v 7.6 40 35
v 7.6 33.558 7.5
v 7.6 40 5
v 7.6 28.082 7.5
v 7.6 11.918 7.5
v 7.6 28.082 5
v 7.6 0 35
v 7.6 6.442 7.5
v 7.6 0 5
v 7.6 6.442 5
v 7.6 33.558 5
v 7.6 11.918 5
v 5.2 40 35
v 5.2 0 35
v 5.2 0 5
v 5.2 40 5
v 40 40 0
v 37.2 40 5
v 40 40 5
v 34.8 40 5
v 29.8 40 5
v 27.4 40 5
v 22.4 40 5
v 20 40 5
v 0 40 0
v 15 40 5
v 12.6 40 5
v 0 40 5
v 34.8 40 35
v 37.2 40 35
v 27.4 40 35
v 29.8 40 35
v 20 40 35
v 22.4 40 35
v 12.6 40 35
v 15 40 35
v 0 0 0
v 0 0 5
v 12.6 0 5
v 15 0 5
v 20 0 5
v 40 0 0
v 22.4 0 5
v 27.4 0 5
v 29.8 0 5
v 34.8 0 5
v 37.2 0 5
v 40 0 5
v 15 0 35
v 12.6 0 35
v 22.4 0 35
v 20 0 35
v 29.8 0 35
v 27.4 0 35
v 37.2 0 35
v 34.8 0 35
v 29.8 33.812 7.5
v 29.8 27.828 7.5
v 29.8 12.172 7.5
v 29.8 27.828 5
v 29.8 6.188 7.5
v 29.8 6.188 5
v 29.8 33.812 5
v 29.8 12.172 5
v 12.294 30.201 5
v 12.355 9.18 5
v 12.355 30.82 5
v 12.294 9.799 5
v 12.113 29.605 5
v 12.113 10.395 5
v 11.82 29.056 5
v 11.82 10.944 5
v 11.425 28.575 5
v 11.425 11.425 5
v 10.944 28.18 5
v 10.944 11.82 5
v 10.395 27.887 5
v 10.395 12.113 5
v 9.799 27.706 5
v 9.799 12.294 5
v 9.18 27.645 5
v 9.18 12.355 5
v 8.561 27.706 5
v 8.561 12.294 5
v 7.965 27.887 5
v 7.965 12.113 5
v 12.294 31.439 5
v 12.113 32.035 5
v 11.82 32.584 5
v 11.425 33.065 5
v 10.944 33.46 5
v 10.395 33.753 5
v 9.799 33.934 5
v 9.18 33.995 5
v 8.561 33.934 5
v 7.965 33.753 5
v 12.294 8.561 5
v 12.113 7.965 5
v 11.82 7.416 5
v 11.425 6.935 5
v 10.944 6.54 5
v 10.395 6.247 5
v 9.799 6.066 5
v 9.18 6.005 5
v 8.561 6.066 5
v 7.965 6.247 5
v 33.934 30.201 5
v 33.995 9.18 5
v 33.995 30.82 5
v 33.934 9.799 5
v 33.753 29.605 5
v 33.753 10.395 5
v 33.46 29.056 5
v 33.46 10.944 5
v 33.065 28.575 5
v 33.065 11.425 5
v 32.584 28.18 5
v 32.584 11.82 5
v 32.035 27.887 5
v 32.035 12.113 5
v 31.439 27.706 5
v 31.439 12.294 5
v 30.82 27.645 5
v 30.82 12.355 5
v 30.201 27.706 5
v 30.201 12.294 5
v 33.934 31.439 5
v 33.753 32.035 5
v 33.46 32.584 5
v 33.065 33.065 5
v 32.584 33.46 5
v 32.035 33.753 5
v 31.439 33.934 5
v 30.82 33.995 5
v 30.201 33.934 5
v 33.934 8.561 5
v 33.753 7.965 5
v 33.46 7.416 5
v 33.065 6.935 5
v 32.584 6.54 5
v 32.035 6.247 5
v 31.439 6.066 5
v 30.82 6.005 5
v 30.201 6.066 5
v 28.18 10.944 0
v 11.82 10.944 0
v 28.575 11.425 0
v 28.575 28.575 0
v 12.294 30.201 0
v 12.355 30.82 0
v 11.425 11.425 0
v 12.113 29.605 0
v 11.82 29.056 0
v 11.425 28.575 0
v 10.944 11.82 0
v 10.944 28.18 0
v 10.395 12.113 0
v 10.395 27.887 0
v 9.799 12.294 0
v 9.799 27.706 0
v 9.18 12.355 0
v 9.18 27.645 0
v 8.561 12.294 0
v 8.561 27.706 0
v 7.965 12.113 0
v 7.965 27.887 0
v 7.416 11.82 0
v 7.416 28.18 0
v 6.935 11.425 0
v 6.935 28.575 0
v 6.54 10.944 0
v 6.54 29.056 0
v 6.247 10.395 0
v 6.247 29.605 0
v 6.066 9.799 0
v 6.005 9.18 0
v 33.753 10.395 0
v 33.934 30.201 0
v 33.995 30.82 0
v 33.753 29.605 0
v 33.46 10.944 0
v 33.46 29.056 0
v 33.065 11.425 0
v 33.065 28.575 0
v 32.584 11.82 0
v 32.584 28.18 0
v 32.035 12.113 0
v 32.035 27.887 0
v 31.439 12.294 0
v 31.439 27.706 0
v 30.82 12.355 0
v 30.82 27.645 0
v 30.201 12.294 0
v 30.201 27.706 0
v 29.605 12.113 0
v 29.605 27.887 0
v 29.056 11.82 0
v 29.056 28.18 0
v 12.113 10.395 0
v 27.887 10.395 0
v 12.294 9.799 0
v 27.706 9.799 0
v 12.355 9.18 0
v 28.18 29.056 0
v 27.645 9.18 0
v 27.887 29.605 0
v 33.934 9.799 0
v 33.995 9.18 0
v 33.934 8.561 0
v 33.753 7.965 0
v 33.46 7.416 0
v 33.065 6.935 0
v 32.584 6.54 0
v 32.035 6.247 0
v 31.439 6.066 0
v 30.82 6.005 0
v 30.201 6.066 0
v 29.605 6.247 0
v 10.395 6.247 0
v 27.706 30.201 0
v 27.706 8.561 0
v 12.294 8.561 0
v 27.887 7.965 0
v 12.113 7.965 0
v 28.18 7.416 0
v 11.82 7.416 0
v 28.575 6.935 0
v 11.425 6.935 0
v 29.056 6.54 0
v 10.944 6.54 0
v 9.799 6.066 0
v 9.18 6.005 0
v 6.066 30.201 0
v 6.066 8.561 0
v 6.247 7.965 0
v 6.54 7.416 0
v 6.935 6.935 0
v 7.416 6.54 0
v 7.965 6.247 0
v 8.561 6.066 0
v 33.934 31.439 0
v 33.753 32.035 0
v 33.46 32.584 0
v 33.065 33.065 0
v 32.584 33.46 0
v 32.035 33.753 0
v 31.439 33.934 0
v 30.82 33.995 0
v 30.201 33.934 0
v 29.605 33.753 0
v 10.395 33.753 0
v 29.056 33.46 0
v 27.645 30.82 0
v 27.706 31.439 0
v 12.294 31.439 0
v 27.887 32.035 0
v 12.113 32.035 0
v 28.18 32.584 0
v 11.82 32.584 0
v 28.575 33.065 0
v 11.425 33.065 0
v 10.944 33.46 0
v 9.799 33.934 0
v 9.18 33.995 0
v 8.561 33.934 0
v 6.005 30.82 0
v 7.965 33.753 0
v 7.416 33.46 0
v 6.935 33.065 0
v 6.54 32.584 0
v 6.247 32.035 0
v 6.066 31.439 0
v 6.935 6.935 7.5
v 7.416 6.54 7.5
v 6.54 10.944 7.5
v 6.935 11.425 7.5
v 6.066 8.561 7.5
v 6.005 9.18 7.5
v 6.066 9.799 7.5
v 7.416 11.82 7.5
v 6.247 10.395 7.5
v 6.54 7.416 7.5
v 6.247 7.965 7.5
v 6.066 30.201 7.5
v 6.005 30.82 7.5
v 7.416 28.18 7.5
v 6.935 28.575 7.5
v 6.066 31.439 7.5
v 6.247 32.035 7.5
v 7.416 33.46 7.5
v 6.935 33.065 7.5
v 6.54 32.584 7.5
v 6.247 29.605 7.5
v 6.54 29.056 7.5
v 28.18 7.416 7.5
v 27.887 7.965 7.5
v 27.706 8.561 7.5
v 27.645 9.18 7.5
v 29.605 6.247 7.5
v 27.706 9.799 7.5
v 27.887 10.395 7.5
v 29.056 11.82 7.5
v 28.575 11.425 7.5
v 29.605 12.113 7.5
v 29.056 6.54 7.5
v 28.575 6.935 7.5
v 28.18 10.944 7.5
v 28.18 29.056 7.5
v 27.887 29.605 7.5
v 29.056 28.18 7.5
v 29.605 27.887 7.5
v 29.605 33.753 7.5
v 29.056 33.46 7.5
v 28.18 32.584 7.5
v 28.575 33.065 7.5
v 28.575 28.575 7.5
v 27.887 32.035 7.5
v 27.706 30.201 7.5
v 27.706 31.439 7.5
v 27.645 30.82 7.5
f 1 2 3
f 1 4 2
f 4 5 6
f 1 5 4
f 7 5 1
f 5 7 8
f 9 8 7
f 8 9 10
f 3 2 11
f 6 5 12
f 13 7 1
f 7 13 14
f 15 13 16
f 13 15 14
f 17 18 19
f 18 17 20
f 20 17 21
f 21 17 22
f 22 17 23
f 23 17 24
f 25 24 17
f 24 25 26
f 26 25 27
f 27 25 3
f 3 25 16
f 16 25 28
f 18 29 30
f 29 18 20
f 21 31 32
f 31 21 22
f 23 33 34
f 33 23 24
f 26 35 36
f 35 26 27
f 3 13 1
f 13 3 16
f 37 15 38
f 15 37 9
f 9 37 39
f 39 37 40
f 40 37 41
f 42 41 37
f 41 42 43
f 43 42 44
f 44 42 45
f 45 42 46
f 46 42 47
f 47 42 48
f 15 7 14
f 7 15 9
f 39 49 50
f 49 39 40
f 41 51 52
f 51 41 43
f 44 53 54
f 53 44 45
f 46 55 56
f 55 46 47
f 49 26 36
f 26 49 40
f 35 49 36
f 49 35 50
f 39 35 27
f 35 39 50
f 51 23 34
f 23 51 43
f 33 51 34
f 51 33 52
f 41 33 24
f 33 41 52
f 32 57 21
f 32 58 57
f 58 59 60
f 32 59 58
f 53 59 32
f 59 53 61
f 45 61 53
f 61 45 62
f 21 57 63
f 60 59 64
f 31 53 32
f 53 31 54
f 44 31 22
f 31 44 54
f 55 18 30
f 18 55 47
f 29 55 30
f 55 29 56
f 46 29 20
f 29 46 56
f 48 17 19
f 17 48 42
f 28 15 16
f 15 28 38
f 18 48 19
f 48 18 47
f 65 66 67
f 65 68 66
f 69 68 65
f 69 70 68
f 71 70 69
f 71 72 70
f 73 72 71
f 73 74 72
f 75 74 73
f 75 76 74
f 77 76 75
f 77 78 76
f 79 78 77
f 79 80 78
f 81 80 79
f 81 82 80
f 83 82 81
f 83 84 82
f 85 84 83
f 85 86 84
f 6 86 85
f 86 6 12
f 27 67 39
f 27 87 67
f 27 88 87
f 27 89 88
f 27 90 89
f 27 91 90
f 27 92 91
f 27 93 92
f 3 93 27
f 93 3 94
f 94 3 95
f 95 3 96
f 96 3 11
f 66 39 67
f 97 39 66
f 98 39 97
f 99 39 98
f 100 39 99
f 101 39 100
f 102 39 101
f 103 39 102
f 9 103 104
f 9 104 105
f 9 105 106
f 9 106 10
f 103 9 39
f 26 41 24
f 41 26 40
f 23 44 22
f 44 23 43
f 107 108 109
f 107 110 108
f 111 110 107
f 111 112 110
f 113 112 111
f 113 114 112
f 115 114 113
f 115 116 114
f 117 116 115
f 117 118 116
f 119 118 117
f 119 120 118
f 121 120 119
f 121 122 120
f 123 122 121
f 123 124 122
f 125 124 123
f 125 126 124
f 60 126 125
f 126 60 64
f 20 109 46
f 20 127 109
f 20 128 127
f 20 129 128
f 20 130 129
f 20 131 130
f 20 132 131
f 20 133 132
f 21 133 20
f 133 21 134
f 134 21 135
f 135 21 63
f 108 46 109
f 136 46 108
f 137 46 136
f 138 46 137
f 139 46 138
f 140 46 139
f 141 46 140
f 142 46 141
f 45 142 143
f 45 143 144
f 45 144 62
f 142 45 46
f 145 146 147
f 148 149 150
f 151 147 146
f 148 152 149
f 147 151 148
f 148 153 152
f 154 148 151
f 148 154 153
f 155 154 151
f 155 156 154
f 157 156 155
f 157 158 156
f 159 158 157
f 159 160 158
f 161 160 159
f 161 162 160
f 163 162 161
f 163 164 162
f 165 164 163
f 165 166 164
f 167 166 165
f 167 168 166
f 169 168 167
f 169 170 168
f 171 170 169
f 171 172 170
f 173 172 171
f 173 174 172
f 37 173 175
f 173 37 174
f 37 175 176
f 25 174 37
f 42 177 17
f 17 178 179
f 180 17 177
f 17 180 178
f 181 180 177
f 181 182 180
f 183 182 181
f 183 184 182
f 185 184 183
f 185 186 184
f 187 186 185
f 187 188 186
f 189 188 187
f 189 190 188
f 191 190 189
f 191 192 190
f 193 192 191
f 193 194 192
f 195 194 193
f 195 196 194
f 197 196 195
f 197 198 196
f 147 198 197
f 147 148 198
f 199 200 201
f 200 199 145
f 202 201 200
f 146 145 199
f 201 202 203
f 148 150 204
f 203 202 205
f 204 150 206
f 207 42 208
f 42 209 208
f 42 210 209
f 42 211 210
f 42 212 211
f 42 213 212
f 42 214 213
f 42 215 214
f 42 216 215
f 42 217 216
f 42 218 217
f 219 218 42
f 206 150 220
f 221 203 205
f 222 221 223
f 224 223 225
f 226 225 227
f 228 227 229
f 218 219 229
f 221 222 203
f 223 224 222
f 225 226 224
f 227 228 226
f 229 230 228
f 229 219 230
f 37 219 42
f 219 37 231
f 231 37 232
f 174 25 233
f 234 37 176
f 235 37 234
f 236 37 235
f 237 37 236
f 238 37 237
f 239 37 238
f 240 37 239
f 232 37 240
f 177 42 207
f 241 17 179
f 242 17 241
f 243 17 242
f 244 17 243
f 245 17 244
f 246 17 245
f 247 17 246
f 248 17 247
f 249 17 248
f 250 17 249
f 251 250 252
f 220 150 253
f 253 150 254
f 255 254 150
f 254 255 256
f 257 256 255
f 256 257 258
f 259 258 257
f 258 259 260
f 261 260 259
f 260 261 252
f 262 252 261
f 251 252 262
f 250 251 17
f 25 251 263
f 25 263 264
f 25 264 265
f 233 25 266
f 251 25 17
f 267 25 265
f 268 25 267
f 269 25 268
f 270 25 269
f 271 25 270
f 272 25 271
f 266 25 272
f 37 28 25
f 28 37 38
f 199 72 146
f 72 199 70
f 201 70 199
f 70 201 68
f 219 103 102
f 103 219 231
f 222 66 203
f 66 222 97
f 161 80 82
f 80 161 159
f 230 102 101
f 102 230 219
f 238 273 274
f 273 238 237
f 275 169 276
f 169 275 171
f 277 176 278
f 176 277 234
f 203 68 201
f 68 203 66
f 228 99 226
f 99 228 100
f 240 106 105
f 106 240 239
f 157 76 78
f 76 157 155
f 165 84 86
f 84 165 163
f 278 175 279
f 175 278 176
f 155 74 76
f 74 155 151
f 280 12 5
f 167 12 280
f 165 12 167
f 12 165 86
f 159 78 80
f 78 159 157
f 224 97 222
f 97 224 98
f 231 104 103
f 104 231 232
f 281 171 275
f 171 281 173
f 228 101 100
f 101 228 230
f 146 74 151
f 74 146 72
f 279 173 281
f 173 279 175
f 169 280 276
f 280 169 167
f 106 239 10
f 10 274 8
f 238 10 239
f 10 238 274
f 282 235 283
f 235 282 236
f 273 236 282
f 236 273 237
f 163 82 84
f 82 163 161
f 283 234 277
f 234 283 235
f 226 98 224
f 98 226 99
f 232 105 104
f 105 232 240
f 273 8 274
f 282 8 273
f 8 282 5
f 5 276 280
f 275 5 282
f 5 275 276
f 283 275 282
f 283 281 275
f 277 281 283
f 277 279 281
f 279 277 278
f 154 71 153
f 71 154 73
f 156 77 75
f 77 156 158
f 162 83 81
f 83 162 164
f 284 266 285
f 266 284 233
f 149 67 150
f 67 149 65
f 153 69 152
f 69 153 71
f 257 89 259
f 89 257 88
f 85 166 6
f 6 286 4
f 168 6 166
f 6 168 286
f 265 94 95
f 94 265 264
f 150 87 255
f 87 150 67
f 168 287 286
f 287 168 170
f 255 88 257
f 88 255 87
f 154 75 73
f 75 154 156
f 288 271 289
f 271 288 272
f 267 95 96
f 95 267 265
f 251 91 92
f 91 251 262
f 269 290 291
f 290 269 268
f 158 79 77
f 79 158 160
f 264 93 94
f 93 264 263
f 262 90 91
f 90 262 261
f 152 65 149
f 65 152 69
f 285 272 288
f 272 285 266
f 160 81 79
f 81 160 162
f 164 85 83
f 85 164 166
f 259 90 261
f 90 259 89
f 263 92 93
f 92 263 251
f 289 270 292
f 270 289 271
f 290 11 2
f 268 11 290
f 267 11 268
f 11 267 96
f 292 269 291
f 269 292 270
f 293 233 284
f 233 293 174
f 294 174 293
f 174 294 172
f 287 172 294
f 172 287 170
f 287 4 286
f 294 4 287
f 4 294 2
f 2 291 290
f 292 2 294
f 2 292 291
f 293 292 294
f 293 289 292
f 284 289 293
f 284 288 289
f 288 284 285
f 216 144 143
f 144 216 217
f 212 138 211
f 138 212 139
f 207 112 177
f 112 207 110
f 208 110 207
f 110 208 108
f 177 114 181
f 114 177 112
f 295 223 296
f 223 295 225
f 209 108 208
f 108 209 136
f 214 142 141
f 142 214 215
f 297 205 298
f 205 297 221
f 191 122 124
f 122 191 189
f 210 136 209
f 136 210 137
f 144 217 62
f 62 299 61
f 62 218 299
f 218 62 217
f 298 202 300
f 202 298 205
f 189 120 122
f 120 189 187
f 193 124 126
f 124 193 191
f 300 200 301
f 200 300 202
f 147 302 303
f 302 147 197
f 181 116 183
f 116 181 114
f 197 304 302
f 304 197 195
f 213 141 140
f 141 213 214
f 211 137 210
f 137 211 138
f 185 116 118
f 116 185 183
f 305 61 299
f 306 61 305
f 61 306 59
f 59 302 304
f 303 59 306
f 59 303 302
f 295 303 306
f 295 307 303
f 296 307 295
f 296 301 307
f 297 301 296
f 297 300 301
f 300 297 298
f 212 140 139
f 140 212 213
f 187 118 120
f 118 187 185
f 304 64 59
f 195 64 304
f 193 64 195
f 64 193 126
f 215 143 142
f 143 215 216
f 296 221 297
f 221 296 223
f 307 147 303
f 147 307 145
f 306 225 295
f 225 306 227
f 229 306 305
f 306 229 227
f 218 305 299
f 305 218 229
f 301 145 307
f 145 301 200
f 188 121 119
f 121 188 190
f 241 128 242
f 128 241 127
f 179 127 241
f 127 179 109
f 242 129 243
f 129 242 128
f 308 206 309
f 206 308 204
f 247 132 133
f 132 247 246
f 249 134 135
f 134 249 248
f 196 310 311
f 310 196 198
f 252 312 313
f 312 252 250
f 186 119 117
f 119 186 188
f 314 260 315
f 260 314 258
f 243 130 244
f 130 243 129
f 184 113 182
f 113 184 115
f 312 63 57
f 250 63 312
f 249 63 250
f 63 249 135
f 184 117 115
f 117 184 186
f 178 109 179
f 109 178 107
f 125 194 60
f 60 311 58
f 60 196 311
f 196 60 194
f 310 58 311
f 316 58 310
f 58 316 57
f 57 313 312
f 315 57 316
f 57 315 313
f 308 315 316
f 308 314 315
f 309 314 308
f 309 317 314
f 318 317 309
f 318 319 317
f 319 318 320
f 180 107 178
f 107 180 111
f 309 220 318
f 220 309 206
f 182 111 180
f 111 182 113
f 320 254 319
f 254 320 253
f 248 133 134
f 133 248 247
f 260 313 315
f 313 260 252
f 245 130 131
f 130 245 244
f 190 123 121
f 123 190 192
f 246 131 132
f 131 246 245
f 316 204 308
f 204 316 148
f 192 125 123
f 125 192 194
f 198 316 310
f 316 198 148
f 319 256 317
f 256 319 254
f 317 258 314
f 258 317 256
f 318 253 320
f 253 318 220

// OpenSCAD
$fn = 32;

// ----------------------------------------------------------------------
// Finned heat sink: 40 x 40 mm base, 30 mm fins
// ----------------------------------------------------------------------

// --- parameters (mm) ---
base_w = 40;              // base width
base_d = 40;              // base depth
base_t = 5;               // base thickness
fin_h = 30;               // fin height above the base
holes_d = 6.35;           // fixing holes
hole_x = 10.82;           // hole offset in x
hole_y = 10.82;           // hole offset in y
fin_t = 2.4;              // fin thickness
fin_pitch = 7.4;          // fin pitch
fin_count = 5;            // number of fins
fin_x0 = 5.2;             // first fin offset

difference() {
  union() {
    cube([base_w, base_d, base_t]);
    for (i = [0 : fin_count - 1]) {
      translate([fin_x0 + i * fin_pitch, 0, base_t - 0.5]) cube([fin_t, base_d, fin_h + 0.5]);
    }
  }
  /* fixing holes through the base, 2.5 mm clear on both sides */
  for (hx = [-10.82, 10.82]) {
    for (hy = [-10.82, 10.82]) {
      translate([base_w / 2 + hx, base_d / 2 + hy, -2.5]) cylinder(h = base_t + 5, d = holes_d);
    }
  }
}
